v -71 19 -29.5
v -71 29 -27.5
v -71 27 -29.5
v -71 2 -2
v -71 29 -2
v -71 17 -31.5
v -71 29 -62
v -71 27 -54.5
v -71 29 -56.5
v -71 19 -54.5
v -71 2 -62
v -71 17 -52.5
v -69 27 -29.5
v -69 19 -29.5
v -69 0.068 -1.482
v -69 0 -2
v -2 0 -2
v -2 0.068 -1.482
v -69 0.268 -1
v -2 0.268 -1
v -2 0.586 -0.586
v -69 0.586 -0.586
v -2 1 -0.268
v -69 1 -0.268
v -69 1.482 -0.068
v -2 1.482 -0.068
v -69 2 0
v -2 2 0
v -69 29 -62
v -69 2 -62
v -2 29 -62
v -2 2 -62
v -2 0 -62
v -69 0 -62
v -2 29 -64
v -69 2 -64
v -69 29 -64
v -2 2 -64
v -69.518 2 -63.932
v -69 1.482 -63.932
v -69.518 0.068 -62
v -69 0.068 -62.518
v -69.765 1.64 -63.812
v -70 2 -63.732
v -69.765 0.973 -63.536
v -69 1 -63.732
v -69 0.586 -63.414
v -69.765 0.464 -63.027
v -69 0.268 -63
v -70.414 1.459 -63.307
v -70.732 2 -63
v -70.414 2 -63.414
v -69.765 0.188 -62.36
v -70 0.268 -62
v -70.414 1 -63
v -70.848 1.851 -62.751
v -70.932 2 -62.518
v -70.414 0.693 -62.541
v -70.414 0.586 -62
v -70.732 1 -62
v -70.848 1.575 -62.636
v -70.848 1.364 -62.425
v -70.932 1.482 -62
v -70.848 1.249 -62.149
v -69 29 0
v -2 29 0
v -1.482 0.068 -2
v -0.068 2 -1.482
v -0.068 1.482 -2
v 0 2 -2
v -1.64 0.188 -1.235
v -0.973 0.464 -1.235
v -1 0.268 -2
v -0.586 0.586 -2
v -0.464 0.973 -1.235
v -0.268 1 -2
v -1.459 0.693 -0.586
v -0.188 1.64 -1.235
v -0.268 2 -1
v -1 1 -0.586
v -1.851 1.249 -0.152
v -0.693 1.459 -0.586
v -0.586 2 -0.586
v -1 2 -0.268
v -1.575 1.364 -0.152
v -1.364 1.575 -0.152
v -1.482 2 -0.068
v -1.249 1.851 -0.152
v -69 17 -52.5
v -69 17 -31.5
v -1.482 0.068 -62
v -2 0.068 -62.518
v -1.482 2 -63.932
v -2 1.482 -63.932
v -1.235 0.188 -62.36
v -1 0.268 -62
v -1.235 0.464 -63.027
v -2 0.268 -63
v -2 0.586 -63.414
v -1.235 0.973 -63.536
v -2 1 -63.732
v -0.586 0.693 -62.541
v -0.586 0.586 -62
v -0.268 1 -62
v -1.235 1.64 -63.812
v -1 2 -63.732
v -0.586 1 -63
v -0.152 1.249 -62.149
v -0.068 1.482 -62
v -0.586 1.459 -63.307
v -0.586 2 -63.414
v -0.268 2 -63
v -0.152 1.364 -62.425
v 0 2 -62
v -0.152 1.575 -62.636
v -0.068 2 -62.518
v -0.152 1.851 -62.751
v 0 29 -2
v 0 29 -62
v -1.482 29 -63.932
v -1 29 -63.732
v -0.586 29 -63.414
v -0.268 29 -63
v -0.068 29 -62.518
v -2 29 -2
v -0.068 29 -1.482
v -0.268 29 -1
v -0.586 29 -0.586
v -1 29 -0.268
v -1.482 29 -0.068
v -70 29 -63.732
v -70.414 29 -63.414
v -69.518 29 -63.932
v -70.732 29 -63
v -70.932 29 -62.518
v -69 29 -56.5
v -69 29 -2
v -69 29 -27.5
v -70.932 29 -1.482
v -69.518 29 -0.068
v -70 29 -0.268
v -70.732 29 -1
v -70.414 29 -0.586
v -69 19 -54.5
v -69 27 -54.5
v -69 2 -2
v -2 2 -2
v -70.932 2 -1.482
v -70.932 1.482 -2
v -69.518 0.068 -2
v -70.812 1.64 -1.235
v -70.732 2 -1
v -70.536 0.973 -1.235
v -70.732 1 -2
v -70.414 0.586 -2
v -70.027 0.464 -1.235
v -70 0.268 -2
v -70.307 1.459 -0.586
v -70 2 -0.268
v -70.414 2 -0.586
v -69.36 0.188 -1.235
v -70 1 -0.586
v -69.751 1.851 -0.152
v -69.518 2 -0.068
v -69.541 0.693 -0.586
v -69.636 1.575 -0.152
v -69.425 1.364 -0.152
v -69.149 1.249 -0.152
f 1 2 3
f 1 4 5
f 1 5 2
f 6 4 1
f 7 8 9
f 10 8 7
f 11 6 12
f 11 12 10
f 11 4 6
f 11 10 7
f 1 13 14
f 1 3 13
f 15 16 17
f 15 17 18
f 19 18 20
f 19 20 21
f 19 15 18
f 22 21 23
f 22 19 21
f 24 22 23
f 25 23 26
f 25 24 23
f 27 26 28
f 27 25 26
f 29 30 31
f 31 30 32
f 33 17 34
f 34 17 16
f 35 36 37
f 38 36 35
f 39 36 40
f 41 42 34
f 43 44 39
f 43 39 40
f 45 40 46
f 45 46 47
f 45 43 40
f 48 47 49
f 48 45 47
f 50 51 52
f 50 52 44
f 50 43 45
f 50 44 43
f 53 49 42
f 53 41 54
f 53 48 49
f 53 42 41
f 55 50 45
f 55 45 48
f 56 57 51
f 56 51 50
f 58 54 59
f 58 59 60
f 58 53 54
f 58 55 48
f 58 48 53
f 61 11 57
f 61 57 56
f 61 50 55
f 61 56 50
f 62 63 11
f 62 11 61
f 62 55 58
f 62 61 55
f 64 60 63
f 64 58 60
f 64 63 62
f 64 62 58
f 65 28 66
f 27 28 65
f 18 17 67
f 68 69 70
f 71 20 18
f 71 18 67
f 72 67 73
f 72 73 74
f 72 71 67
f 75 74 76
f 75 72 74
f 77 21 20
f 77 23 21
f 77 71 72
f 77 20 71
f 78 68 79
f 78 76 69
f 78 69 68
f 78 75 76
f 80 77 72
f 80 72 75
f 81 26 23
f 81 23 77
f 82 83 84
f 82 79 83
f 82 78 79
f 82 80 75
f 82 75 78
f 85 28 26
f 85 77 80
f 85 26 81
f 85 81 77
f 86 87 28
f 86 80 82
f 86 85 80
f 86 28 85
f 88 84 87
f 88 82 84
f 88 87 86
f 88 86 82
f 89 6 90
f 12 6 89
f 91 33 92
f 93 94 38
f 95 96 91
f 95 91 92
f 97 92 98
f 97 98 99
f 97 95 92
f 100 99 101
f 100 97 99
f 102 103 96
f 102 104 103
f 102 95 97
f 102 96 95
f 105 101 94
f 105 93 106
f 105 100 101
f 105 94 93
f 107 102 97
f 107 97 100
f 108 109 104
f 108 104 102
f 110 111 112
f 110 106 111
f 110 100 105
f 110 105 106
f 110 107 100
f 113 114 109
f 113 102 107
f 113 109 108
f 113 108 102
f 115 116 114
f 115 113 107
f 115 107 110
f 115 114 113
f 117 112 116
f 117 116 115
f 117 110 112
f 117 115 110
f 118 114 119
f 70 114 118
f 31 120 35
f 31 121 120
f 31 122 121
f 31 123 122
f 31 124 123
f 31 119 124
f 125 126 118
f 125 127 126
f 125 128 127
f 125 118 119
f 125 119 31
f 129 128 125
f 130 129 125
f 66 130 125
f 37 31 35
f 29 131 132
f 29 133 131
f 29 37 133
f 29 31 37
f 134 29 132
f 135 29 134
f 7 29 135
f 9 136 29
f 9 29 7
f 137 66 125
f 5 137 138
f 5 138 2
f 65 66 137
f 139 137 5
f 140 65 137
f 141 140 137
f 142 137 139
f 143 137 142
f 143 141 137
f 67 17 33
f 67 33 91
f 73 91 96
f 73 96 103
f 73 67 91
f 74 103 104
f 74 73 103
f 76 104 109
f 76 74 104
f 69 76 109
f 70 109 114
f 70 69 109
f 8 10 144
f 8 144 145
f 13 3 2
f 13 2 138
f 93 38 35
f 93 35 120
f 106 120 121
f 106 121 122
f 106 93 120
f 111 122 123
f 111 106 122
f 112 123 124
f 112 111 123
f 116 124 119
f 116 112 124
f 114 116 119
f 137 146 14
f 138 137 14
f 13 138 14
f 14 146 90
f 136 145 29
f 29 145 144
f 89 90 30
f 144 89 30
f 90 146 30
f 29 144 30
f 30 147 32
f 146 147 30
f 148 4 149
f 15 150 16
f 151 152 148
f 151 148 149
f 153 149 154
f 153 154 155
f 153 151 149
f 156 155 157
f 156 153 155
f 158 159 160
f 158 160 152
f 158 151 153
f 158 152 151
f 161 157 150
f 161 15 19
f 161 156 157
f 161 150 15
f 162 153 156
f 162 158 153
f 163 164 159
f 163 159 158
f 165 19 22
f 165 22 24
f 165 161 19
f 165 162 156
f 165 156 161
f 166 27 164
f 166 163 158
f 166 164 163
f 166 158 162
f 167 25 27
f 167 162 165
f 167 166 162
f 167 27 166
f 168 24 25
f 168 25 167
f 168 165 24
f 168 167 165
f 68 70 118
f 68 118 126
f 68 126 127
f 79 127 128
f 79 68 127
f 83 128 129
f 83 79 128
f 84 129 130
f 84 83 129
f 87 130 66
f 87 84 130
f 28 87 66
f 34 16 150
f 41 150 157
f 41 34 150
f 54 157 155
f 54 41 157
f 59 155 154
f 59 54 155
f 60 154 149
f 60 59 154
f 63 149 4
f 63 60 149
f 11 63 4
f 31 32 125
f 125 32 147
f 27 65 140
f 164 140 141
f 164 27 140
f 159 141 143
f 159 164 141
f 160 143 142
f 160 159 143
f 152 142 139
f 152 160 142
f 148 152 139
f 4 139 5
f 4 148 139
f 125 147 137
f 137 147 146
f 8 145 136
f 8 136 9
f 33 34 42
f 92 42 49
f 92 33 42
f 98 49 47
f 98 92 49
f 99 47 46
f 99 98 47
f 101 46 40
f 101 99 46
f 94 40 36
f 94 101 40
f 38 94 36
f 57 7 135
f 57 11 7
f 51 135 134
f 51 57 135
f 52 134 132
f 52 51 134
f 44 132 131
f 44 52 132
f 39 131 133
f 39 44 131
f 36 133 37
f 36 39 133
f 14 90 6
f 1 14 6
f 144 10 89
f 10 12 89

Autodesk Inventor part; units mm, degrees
ref_plane "YZ Plane" through (0, 0, 0) normal (1, 0, 0) x (0, 1, 0)
ref_plane "XZ Plane" through (0, 0, 0) normal (0, 1, 0) x (-1, 0, 0)
ref_plane "XY Plane" through (0, 0, 0) normal (0, 0, 1) x (1, 0, 0)
sketch "Schizzo1" plane through (0, 0, 0) normal (0, 1, 0) x (-1, 0, 0)
  line L0 (0, 0) -> (71, 0)
  line L1 (71, 0) -> (71, -64)
  line L2 (71, -64) -> (0, -64)
  line L3 (0, -64) -> (0, 0)
  dimension "d0" = 71
  dimension "d1" = 64
extrude "Estrusione1" add sketch "Schizzo1" along normal blind 29
shell "Svuotamento1" thickness 2 removed faces 1 at (-23.6667, 29, -21.3333)
fillet "Raccordo1" radius 2 4 edges at (0, 0, -32) (-35.5, 0, -64) (-35.5, 0, 0) (-71, 0, -32)
fillet "Raccordo2" radius 2 8 edges at (-0.5858, 0.5858, -63.4142) (0, 15.5, -64) (-0.5858, 0.5858, -0.5858) (0, 15.5, 0) (-70.4142, 0.5858, -63.4142) (-71, 15.5, -64) (-70.4142, 0.5858, -0.5858) (-71, 15.5, 0)
sketch "Schizzo3" plane through (-71, 2, -2) normal (-1, 0, 0) x (0, 0, 1)
  line L0 (-52.5, 27) -> (-27.5, 27)
  line L1 (-27.5, 27) -> (-27.5, 15)
  line L2 (-27.5, 15) -> (-52.5, 15)
  line L3 (-52.5, 15) -> (-52.5, 27)
  line L4 (-62, 27) -> (-62, 0) projected
  line L5 (-60, 27) -> (0, 27) projected
  line L6 (-60, 0) -> (-60, 27) projected
  line L7 (-60, 0) -> (-60, 27) projected
  point P0 (2, -2)
  dimension "d16" = 0
  dimension "d17" = 12
  dimension "d23" = 7.5
  dimension "d24" = 25
extrude "Estrusione3" cut sketch "Schizzo3" against normal up to next
chamfer "Smusso2" distance 2 angle 45 4 edges at (-70, 29, -54.5) (-70, 29, -29.5) (-70, 17, -29.5) (-70, 17, -54.5)
properties part number "Board_cover"
